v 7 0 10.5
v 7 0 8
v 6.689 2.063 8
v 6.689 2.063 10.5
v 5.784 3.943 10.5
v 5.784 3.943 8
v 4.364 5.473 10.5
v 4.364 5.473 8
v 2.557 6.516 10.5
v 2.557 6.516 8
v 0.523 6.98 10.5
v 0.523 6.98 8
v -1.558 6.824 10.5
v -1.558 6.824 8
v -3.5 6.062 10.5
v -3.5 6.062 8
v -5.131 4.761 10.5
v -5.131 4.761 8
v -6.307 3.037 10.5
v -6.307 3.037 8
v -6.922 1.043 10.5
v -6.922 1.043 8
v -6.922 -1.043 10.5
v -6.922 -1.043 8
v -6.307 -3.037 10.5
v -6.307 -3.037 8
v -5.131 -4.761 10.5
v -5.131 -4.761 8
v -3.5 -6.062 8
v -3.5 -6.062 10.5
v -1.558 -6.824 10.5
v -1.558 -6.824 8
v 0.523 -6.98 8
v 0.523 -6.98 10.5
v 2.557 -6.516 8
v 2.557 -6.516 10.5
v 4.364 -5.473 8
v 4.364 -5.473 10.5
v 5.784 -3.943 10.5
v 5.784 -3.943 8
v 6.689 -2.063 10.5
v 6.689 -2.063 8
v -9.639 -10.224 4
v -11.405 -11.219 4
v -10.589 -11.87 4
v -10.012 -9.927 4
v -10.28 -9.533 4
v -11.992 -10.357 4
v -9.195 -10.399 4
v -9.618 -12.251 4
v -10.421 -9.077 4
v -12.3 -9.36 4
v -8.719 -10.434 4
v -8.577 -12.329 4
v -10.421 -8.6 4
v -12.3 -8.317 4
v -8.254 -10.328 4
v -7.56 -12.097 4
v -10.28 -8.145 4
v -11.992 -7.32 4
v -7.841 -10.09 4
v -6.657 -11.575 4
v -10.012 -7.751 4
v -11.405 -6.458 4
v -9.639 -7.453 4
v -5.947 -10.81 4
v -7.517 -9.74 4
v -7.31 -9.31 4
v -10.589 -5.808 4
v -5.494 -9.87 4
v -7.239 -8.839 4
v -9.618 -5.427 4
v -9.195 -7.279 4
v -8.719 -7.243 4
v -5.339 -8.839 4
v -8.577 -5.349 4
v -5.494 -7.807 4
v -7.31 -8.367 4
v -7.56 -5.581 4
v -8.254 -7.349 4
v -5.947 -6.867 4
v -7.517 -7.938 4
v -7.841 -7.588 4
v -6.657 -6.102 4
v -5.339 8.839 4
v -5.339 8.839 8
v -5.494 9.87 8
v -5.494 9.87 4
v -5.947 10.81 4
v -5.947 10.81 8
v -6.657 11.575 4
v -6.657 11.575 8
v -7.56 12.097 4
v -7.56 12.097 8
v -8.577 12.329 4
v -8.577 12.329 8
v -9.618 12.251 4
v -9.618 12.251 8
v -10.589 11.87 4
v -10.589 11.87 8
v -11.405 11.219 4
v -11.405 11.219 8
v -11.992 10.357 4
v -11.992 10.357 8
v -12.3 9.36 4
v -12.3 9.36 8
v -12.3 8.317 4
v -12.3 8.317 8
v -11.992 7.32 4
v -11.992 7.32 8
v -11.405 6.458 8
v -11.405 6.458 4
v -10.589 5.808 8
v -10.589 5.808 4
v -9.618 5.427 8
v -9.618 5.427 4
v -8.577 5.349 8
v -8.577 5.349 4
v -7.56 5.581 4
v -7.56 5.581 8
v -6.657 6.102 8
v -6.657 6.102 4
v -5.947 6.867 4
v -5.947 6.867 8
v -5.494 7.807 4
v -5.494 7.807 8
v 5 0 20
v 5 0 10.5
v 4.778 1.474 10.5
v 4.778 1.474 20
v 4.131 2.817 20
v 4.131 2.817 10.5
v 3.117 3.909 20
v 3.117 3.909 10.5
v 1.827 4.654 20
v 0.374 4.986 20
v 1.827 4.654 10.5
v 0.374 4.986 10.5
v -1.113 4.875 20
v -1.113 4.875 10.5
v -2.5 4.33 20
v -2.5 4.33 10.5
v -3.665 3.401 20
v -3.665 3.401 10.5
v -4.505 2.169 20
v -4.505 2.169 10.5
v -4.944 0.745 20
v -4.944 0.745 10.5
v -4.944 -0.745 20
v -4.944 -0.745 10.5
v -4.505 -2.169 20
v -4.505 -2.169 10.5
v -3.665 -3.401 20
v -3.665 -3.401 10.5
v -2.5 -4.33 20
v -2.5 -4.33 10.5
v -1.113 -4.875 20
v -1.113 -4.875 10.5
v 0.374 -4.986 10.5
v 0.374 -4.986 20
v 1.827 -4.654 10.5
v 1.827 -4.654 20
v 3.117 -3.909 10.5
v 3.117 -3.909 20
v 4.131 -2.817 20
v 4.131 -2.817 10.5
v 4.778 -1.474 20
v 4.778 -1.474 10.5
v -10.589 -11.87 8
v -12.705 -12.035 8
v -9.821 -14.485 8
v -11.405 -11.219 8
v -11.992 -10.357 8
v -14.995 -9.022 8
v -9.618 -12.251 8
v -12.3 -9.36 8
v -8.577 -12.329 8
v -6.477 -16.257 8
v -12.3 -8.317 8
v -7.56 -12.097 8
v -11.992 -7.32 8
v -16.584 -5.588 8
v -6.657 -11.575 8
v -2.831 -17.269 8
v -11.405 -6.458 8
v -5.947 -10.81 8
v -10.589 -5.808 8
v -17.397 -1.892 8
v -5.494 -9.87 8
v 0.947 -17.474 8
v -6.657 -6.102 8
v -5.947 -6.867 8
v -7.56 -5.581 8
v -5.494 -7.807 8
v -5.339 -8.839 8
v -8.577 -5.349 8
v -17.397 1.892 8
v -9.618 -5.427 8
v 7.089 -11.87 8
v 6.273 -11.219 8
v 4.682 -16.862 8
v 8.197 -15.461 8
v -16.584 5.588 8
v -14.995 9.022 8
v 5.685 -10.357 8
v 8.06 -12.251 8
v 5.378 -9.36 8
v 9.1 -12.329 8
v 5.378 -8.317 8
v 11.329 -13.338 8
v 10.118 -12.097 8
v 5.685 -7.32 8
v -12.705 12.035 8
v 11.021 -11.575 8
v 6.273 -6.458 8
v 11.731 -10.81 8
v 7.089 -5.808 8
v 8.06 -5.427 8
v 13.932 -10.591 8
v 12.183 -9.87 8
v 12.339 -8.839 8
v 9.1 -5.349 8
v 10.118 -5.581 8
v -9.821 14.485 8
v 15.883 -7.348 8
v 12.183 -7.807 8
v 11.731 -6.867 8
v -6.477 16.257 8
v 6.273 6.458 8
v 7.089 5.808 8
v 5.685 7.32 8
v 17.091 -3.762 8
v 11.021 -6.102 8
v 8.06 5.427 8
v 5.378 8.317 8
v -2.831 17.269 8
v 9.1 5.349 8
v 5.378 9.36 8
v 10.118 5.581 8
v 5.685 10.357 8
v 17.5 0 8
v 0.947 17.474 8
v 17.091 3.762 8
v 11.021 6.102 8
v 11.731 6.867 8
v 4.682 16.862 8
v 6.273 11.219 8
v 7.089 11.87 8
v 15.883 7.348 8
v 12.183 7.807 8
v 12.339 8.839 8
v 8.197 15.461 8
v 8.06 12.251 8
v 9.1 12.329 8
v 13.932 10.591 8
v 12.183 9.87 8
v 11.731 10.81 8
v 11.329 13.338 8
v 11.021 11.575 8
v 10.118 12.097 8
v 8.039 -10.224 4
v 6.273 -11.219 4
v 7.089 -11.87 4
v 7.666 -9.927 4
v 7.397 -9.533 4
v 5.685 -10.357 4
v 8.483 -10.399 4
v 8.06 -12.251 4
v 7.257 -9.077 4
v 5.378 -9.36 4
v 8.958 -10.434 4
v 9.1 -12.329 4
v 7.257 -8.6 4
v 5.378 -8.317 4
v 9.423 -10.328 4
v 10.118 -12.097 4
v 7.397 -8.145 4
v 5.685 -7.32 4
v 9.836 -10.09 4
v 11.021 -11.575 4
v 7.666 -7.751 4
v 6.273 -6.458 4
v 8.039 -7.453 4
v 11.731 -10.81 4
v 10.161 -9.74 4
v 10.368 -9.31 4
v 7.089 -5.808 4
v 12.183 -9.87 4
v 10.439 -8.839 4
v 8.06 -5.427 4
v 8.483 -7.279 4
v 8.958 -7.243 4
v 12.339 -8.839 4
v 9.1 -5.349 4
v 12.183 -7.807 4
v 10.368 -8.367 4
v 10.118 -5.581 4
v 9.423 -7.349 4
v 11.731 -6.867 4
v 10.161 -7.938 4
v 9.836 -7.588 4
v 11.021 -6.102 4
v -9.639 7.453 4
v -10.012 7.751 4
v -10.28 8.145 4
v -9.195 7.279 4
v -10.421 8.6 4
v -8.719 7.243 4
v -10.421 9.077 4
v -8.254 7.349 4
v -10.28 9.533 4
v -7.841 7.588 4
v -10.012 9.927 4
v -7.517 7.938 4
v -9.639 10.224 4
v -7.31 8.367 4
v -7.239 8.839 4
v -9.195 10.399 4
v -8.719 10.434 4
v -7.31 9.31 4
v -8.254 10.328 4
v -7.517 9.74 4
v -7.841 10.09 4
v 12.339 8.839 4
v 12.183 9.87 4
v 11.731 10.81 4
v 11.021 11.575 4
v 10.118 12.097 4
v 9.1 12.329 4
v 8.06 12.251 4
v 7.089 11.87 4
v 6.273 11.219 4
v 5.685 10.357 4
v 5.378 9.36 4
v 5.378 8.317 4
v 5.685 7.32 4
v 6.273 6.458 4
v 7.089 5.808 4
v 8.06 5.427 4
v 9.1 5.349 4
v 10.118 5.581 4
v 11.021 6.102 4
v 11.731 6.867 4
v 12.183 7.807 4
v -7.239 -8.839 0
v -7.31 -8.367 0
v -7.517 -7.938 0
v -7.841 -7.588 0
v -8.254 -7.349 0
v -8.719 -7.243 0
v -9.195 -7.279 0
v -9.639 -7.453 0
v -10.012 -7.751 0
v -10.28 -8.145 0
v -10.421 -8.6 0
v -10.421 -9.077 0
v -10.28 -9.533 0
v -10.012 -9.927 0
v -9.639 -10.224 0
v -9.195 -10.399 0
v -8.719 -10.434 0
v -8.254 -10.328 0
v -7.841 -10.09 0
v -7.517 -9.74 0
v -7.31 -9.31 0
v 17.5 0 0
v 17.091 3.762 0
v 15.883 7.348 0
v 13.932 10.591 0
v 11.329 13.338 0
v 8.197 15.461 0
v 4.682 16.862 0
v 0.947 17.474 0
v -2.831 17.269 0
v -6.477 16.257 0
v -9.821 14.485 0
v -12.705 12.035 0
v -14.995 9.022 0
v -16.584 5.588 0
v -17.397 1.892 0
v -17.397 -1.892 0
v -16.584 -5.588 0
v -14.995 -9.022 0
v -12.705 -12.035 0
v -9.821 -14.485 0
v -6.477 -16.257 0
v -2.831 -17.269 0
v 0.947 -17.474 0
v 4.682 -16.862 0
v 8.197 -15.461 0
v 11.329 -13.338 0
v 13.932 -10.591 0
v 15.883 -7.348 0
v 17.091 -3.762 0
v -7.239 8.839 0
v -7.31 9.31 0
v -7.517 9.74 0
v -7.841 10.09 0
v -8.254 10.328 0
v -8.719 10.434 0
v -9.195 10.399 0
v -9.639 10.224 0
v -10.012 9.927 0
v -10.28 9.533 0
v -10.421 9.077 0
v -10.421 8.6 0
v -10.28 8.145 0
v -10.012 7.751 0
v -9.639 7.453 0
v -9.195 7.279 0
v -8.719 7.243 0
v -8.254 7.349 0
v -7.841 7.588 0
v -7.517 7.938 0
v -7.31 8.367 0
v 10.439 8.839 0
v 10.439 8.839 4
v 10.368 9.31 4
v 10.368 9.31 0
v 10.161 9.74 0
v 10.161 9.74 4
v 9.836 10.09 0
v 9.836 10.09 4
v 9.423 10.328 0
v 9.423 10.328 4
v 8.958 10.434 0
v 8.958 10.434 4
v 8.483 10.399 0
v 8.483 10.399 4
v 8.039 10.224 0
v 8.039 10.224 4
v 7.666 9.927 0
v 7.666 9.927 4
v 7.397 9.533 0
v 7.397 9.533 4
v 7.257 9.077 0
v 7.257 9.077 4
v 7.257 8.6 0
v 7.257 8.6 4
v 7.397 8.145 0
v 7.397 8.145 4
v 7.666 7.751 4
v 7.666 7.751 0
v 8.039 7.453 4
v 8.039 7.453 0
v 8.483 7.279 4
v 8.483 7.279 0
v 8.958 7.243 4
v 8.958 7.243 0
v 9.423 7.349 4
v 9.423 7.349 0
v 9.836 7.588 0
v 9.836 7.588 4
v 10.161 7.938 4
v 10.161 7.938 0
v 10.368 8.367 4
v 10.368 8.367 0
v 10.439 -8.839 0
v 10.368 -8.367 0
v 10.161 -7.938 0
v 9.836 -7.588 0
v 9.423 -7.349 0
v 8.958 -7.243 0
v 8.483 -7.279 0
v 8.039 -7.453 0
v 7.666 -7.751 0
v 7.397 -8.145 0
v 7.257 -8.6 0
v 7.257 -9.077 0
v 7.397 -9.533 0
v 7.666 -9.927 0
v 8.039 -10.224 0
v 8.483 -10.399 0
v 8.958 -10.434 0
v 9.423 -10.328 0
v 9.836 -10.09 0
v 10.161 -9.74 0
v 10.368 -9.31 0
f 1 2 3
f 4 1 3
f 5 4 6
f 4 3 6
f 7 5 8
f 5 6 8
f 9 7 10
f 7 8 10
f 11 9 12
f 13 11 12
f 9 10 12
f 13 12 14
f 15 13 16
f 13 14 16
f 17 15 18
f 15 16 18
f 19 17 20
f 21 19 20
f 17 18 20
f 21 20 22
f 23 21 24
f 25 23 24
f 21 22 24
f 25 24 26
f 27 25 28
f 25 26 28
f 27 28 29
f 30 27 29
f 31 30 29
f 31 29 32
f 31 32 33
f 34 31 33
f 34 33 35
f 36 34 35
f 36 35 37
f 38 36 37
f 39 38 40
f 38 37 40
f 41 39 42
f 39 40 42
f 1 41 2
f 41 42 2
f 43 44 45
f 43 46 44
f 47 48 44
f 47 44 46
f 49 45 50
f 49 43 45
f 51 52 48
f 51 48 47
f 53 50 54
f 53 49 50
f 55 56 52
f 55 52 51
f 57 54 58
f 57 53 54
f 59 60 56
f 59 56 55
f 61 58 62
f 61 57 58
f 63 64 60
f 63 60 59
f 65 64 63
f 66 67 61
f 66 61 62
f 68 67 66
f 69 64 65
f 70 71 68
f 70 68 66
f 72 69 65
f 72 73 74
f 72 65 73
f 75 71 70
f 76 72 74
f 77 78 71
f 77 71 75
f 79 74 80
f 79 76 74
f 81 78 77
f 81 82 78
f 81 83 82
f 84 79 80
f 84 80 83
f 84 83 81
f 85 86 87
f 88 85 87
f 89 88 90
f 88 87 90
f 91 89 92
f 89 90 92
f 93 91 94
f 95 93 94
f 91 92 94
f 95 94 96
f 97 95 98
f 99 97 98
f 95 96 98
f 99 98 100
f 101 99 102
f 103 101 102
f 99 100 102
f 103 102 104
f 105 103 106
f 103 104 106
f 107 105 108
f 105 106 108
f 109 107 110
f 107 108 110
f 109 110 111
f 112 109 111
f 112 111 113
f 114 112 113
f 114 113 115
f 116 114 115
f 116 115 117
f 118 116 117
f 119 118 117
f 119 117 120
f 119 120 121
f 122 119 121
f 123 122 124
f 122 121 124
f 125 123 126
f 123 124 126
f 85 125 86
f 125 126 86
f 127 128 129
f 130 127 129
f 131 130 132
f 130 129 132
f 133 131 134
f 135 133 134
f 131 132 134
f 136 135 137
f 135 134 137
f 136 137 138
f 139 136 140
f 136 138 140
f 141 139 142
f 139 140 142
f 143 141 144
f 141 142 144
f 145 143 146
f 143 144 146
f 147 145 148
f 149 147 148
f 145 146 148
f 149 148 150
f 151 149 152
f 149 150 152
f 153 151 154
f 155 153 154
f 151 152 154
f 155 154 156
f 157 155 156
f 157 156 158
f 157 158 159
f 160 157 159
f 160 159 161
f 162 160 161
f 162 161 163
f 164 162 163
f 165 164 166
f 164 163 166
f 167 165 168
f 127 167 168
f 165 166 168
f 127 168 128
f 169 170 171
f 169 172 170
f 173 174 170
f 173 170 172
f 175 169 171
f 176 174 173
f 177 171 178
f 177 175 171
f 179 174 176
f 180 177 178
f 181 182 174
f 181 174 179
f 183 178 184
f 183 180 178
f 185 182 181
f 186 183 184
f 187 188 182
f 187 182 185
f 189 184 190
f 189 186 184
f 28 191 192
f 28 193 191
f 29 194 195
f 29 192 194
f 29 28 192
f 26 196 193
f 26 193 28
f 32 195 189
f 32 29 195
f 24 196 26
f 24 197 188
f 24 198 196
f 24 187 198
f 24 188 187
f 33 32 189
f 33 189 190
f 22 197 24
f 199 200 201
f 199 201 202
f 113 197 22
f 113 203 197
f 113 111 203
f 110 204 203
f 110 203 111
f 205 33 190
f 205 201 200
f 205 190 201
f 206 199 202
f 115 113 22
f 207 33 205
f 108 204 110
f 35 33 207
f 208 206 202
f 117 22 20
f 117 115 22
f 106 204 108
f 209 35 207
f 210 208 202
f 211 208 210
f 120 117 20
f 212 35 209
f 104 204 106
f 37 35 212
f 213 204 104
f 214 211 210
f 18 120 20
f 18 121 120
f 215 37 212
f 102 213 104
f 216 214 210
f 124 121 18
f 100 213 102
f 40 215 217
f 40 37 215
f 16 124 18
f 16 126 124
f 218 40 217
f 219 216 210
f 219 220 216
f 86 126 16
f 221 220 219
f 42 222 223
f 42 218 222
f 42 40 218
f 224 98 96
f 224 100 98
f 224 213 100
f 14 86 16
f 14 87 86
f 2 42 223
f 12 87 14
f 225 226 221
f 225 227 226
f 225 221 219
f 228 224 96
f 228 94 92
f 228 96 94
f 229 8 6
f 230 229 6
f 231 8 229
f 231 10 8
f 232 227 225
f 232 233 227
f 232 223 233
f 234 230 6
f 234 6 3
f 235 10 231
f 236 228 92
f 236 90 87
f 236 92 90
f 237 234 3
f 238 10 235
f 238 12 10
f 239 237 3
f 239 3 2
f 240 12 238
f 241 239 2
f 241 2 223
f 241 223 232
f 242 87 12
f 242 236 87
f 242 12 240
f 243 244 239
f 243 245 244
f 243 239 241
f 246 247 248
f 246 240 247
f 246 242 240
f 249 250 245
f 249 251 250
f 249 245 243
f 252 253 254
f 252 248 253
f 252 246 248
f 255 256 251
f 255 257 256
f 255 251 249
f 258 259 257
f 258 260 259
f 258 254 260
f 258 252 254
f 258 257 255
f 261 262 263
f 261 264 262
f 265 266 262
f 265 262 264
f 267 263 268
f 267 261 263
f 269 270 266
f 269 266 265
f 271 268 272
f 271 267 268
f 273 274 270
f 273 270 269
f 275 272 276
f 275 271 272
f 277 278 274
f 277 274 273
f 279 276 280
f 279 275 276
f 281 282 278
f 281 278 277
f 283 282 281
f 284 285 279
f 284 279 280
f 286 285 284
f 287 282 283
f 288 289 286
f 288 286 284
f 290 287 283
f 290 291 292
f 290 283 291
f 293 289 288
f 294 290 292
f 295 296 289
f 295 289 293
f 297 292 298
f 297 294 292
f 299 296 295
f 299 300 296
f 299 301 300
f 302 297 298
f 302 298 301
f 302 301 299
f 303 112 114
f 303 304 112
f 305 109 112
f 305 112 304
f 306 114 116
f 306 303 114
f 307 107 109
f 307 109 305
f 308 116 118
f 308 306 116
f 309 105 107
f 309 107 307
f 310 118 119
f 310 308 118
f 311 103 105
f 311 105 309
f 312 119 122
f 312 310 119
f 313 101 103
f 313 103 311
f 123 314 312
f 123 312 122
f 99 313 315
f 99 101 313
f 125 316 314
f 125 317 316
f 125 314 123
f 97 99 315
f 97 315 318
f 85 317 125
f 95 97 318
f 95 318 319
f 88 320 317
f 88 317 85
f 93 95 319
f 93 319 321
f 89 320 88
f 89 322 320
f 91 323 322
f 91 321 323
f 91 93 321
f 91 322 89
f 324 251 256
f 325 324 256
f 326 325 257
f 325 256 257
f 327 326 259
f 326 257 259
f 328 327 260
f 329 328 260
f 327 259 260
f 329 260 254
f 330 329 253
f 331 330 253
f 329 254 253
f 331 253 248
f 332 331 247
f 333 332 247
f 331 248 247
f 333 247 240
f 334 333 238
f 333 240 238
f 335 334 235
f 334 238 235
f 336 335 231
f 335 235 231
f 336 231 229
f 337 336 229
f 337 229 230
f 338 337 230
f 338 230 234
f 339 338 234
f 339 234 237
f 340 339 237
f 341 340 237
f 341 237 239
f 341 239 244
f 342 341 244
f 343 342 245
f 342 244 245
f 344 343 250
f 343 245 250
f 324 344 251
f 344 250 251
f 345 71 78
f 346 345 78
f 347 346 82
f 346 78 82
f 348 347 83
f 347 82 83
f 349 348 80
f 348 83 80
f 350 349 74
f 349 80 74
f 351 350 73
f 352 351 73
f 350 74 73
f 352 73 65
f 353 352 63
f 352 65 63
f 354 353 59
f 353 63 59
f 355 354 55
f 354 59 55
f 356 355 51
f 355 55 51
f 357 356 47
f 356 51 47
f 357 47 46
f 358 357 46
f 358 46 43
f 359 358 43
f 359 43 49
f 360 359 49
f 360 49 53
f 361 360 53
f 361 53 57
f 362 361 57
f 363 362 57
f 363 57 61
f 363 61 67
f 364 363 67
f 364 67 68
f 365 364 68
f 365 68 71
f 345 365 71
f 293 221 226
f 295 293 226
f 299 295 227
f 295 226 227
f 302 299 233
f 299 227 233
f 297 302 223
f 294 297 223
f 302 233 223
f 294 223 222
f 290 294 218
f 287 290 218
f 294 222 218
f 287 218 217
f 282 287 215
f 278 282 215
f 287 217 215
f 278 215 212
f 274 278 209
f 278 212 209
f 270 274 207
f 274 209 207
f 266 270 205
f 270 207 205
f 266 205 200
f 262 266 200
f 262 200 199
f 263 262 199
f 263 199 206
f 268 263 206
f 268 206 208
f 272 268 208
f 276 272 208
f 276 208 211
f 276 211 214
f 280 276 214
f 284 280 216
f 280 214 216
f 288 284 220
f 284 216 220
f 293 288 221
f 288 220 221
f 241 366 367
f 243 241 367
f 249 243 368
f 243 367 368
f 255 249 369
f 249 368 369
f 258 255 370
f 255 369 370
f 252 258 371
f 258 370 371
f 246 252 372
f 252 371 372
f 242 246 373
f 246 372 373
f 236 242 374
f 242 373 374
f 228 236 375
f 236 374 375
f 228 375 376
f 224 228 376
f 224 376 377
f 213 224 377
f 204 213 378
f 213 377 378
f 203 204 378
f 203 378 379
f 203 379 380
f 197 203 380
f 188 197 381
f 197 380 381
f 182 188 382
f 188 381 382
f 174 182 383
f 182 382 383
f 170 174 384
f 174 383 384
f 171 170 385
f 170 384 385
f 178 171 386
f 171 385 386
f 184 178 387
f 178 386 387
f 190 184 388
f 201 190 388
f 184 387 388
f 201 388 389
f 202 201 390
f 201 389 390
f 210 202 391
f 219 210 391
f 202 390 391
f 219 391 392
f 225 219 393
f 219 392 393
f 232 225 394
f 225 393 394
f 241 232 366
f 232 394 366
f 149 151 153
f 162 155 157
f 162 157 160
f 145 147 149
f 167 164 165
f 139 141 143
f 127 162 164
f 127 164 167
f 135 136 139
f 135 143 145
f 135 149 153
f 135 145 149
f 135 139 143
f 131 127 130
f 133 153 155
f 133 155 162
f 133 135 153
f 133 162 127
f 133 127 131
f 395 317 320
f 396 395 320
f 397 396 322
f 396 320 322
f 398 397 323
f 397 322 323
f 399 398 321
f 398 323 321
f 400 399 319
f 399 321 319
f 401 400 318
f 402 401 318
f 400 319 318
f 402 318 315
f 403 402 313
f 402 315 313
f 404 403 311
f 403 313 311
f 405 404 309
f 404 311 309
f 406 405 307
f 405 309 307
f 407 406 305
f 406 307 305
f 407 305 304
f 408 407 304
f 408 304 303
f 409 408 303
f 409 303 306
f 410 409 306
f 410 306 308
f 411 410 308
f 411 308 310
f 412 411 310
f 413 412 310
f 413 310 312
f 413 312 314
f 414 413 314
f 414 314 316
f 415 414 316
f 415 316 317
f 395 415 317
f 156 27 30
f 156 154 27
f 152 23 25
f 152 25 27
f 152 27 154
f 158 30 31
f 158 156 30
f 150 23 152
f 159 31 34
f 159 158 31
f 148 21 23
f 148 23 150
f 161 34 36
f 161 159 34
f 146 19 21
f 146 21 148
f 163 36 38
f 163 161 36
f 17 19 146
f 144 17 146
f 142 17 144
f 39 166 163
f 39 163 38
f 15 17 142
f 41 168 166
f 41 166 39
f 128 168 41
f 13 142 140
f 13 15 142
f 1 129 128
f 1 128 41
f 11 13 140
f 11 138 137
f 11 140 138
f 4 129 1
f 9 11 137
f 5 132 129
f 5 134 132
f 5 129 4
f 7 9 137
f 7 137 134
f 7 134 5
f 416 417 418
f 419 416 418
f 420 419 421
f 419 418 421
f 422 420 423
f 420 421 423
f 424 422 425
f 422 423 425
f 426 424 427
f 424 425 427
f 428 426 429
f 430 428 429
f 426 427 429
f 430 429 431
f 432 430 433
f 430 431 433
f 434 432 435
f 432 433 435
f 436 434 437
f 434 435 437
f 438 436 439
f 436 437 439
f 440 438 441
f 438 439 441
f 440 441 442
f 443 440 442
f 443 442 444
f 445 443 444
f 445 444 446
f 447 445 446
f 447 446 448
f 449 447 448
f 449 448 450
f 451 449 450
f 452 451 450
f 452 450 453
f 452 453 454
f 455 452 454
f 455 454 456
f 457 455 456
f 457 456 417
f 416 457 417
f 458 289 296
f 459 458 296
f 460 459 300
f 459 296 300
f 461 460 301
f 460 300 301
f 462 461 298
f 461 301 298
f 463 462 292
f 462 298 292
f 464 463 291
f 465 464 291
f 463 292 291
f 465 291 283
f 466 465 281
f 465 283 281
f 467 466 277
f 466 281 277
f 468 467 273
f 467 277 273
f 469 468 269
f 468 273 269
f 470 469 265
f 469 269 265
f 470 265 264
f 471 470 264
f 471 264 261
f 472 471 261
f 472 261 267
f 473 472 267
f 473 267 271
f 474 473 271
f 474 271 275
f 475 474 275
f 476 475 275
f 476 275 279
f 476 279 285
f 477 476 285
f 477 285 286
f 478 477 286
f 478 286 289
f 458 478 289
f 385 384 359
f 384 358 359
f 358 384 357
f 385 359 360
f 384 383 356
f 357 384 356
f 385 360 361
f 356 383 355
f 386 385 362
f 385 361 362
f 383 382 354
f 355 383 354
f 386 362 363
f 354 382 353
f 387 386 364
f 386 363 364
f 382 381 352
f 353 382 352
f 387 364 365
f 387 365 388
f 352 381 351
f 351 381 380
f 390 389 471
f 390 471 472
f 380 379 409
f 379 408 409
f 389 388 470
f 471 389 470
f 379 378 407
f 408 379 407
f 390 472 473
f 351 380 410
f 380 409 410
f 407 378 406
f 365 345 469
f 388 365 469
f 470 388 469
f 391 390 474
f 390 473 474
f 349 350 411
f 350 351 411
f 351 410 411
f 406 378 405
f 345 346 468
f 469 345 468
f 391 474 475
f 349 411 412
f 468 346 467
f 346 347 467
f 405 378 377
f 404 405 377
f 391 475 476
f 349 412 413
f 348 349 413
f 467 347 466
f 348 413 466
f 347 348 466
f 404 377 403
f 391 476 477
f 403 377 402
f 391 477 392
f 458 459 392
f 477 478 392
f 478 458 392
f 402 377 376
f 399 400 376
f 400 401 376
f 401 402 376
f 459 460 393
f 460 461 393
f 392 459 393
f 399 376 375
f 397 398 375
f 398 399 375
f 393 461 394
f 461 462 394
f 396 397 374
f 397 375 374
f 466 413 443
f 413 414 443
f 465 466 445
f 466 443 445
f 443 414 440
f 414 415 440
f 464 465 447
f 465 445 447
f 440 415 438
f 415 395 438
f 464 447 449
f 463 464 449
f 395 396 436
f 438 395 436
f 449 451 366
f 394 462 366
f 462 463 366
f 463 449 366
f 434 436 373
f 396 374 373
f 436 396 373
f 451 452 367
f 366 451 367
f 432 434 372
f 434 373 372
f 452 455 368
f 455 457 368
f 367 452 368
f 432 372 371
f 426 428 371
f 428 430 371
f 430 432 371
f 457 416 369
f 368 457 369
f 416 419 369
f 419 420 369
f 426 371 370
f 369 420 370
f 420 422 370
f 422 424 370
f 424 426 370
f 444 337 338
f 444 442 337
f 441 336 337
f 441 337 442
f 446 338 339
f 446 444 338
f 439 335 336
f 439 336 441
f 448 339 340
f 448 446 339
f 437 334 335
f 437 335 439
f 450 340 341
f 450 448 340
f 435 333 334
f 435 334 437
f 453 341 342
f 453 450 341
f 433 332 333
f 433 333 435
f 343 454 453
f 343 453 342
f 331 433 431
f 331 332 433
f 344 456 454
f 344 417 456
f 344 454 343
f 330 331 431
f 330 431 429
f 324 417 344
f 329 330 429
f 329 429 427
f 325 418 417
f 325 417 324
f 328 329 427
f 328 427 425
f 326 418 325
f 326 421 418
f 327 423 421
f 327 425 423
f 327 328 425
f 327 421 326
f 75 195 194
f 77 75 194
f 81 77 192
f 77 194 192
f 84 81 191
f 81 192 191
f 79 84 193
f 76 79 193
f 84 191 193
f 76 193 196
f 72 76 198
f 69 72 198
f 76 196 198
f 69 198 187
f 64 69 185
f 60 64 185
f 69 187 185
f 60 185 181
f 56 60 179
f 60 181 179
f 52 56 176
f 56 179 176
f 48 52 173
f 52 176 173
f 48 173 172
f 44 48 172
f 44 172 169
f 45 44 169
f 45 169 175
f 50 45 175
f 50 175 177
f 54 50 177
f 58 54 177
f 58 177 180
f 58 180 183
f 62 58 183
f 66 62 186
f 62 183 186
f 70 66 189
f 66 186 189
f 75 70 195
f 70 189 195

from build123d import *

# Parameters (mm, degrees)
SKETCH_1_R          = 17.5
EXTRUDE_1_DEPTH     = 8
SKETCH_2_R          = 7
EXTRUDE_2_DEPTH     = 2.5
SKETCH_3_R          = 5
EXTRUDE_3_DEPTH     = 9.5
SKETCH_4_R          = 1.6
CUT_EXTRUDE_1_DEPTH = 28.504545079
SKETCH_5_R          = 3.5
SKETCH_5_R_2        = 1.6
CUT_EXTRUDE_2_DEPTH = 4


with BuildPart() as part:
    # ｽｹｯﾁ1 → ﾎﾞｽ - 押し出し1 (new body)
    with BuildSketch(Plane.XY):
        Circle(SKETCH_1_R)
    extrude(amount=EXTRUDE_1_DEPTH)

    # ｽｹｯﾁ2 → ﾎﾞｽ - 押し出し2 (add)
    with BuildSketch(Plane.XY.offset(8)):
        Circle(SKETCH_2_R)
    extrude(amount=EXTRUDE_2_DEPTH)

    # ｽｹｯﾁ3 → ﾎﾞｽ - 押し出し3 (add)
    with BuildSketch(Plane.XY.offset(10.5)):
        Circle(SKETCH_3_R)
    extrude(amount=EXTRUDE_3_DEPTH)

    # ｽｹｯﾁ4 → ｶｯﾄ - 押し出し1 (cut, through all)
    with BuildSketch(Plane.XY.offset(8)):
        with Locations((8.838834765, 8.838834765)):
            Circle(SKETCH_4_R)
        with Locations((8.838834765, -8.838834765)):
            Circle(SKETCH_4_R)
        with Locations((-8.838834765, -8.838834765)):
            Circle(SKETCH_4_R)
        with Locations((-8.838834765, 8.838834765)):
            Circle(SKETCH_4_R)
    extrude(amount=-CUT_EXTRUDE_1_DEPTH, mode=Mode.SUBTRACT)

    # ｽｹｯﾁ5 → ｶｯﾄ - 押し出し2 (cut)
    # profile 1 of 4: a face of its own
    with BuildSketch(Plane.XY.offset(8)):
        with Locations((8.838834765, 8.838834765)):
            Circle(SKETCH_5_R)
        with Locations((8.838834765, 8.838834765)):
            Circle(SKETCH_5_R_2, mode=Mode.SUBTRACT)
    # profile 2 of 4: a face of its own
    with BuildSketch(Plane.XY.offset(8)):
        with Locations((8.838834765, -8.838834765)):
            Circle(SKETCH_5_R)
        with Locations((8.838834765, -8.838834765)):
            Circle(SKETCH_5_R_2, mode=Mode.SUBTRACT)
    # profile 3 of 4: a face of its own
    with BuildSketch(Plane.XY.offset(8)):
        with Locations((-8.838834765, -8.838834765)):
            Circle(SKETCH_5_R)
        with Locations((-8.838834765, -8.838834765)):
            Circle(SKETCH_5_R_2, mode=Mode.SUBTRACT)
    # profile 4 of 4: a face of its own
    with BuildSketch(Plane.XY.offset(8)):
        with Locations((-8.838834765, 8.838834765)):
            Circle(SKETCH_5_R)
        with Locations((-8.838834765, 8.838834765)):
            Circle(SKETCH_5_R_2, mode=Mode.SUBTRACT)
    extrude(amount=-CUT_EXTRUDE_2_DEPTH, mode=Mode.SUBTRACT)


solid = part.part
